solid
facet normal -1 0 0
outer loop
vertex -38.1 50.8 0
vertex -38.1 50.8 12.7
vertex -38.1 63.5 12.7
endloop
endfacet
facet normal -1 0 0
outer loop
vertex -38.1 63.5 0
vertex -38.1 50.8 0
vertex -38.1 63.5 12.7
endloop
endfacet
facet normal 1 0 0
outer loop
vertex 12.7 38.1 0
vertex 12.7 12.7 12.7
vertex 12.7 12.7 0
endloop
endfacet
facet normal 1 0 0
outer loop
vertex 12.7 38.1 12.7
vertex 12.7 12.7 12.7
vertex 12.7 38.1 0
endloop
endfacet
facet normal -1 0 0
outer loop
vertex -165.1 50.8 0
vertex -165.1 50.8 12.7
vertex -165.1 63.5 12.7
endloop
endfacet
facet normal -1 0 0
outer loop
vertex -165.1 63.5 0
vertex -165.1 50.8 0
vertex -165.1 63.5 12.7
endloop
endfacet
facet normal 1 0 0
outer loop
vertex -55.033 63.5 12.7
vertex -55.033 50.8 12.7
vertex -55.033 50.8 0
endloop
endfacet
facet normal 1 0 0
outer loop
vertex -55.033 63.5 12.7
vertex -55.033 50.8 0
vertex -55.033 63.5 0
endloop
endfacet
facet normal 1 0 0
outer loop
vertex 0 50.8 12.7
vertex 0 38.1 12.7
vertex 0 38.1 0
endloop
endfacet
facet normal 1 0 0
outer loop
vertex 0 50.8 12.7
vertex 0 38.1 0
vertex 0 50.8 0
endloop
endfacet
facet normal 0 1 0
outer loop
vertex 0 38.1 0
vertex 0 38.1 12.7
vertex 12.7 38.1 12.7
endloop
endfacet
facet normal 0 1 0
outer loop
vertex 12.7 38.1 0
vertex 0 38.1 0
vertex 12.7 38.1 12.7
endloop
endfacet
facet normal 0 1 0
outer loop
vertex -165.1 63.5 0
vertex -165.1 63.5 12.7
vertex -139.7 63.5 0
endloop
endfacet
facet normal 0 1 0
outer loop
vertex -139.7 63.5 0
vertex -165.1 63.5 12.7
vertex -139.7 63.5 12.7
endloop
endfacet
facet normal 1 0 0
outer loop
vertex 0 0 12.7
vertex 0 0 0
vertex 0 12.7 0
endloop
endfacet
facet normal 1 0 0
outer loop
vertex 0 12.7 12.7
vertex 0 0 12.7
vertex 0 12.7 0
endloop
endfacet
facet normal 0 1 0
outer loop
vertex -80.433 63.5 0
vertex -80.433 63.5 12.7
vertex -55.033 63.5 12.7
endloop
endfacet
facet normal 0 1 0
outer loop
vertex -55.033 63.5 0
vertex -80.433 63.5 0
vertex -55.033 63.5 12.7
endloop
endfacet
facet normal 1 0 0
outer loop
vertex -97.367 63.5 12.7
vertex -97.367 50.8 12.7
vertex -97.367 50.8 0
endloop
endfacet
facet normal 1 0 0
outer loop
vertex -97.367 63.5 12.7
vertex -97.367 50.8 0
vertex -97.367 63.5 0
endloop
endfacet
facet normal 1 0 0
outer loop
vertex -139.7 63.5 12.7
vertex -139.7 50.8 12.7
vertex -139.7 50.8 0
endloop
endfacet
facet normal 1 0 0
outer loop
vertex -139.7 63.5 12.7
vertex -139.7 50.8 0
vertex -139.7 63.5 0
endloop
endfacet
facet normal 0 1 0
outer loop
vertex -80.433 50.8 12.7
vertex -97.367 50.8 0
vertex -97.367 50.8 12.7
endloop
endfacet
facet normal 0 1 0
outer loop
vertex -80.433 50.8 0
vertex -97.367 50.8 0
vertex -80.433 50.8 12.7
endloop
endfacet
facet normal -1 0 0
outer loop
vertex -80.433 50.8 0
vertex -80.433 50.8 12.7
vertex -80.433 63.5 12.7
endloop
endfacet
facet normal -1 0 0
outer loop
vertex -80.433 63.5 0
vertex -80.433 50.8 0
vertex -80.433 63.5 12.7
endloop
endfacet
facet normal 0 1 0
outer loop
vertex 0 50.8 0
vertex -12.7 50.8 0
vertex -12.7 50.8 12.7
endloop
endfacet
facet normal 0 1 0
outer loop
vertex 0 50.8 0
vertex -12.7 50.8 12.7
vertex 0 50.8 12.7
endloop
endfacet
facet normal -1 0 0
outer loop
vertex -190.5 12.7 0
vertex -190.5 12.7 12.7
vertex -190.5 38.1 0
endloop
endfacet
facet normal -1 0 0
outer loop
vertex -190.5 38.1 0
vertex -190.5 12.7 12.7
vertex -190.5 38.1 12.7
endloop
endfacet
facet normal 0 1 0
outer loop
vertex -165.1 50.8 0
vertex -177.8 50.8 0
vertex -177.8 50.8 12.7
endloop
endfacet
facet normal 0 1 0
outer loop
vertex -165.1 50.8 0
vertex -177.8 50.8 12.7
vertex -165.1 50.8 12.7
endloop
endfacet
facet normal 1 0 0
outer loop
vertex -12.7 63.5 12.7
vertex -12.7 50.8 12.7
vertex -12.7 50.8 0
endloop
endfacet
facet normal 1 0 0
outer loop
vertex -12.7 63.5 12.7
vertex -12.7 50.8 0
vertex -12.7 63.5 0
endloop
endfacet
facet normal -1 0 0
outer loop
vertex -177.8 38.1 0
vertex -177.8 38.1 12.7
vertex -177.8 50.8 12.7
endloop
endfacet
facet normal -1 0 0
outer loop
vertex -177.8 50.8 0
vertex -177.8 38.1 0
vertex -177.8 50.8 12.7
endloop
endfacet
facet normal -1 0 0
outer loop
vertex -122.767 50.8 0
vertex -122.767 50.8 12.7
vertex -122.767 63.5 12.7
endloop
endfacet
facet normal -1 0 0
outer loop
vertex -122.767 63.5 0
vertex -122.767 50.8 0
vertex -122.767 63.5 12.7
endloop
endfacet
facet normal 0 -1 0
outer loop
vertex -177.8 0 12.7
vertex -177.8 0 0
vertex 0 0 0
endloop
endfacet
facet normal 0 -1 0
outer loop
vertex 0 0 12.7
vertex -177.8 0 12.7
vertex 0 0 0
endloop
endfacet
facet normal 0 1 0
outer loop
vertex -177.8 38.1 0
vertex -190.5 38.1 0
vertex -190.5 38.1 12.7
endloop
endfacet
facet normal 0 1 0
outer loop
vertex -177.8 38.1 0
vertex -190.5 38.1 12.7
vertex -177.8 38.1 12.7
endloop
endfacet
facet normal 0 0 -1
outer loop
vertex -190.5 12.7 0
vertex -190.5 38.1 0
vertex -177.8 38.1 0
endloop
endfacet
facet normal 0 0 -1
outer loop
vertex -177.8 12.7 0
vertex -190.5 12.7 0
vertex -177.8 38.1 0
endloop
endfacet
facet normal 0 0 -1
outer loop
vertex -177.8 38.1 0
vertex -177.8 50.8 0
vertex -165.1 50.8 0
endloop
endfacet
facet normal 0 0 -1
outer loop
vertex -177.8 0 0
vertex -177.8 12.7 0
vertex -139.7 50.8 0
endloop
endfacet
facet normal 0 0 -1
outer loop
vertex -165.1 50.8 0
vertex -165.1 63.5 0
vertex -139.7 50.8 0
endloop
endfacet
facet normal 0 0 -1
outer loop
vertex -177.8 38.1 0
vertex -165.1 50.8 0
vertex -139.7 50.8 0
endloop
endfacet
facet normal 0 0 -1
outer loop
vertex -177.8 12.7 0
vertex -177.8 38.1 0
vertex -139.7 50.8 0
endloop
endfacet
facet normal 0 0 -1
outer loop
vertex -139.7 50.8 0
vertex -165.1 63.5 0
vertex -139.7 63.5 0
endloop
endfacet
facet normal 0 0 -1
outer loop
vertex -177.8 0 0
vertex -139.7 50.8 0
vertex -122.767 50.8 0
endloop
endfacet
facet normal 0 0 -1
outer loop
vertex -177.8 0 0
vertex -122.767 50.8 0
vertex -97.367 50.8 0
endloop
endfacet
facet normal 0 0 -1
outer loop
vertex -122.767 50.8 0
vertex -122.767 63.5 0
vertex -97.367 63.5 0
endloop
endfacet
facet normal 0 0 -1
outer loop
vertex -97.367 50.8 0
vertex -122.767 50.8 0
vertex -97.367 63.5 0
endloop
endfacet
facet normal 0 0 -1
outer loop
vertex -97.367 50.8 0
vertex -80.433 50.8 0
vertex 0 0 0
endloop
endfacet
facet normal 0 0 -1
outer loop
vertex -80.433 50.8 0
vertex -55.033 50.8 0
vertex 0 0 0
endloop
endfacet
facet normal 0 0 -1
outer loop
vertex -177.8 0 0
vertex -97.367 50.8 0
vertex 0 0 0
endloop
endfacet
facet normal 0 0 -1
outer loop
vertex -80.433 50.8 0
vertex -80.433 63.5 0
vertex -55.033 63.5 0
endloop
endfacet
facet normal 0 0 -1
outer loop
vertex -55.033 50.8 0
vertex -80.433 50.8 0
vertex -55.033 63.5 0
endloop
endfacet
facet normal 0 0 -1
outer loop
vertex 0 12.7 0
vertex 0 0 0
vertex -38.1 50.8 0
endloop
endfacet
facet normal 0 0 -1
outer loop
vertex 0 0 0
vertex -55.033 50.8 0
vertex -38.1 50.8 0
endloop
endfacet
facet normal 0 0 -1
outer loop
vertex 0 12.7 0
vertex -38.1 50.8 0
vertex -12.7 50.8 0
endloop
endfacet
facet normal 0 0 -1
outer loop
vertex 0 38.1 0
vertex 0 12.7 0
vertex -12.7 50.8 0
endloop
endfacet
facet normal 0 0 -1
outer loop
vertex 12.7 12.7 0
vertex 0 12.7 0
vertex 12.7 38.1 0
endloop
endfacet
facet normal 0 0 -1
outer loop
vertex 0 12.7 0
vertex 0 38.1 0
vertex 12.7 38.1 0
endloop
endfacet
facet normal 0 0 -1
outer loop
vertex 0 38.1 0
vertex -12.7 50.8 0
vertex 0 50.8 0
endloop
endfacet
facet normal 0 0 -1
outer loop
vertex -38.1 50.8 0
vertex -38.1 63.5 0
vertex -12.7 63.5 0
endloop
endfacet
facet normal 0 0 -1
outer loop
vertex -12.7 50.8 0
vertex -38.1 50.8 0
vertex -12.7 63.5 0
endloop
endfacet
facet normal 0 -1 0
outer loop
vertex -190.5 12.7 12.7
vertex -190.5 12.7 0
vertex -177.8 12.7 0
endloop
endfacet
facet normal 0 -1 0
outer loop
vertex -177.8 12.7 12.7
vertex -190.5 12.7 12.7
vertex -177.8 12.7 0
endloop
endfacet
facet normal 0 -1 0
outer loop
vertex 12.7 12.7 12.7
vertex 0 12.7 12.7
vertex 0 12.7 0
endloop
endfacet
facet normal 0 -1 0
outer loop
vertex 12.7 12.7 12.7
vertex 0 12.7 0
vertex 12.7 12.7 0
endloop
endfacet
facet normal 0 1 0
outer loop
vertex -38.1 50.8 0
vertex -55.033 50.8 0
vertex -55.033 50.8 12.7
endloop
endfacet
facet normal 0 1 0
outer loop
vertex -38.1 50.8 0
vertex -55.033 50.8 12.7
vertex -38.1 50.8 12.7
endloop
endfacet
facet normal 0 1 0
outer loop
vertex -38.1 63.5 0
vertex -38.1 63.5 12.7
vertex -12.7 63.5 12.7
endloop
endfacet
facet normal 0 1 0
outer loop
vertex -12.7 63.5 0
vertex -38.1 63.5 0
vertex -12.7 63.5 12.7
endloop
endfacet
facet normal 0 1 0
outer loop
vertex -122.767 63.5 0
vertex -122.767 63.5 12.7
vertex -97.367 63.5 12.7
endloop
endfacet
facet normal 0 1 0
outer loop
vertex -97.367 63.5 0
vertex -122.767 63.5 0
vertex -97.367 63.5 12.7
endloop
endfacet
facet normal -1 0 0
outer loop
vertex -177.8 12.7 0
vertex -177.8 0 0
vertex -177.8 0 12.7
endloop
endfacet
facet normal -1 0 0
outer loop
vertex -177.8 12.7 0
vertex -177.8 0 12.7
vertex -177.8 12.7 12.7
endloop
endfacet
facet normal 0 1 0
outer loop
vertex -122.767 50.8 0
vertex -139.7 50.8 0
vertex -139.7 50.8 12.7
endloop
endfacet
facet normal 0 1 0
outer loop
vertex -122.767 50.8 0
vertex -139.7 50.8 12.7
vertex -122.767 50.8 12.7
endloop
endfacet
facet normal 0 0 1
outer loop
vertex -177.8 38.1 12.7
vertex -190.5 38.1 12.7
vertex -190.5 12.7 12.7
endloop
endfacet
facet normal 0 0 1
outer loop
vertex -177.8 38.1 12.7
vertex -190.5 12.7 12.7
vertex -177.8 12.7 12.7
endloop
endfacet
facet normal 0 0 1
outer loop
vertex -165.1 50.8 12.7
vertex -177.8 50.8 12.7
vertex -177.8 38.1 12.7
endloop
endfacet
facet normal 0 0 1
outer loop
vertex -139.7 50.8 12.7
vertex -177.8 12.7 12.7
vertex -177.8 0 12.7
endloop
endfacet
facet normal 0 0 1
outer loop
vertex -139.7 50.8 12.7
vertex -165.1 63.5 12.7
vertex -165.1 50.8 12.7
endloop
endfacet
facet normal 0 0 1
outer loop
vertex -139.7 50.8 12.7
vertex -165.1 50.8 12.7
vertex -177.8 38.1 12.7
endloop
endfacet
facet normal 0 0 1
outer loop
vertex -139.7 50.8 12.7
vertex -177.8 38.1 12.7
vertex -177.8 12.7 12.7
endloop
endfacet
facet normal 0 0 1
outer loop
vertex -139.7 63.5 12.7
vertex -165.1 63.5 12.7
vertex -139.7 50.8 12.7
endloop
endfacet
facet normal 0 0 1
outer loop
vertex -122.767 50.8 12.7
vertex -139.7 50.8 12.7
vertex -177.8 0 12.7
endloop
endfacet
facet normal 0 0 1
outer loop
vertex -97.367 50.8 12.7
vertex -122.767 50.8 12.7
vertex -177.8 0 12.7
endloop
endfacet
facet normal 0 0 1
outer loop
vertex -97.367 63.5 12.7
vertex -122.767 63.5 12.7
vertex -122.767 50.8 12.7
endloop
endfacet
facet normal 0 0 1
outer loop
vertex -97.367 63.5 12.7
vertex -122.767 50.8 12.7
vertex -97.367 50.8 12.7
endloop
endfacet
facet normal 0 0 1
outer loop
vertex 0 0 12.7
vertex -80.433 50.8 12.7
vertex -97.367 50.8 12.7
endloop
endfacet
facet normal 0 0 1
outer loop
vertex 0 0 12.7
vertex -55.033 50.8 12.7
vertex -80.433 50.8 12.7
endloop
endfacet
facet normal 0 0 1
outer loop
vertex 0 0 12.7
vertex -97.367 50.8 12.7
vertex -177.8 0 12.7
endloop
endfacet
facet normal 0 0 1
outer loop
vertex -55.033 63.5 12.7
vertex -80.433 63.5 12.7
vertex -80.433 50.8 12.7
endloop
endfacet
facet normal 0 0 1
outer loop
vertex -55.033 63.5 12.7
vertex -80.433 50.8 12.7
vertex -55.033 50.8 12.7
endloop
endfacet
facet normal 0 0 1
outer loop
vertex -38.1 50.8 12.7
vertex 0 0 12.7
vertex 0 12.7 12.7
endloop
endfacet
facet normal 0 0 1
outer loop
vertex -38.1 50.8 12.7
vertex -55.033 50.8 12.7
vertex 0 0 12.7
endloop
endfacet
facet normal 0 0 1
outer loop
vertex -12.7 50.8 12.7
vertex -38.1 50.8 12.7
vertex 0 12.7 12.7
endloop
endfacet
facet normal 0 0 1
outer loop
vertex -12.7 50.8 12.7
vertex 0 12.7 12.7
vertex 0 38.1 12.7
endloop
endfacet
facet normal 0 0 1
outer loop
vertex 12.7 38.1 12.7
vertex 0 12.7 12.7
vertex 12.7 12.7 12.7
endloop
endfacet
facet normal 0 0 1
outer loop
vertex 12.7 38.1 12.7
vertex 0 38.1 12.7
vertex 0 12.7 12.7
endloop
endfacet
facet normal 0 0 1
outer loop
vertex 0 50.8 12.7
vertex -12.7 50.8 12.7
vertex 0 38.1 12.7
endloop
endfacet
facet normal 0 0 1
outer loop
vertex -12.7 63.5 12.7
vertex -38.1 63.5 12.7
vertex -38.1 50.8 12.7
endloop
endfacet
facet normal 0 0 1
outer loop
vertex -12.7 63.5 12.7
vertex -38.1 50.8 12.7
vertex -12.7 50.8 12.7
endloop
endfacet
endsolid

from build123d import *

# Parameters (mm, degrees)
SKETCH1_W           = 177.8
SKETCH1_H           = 50.8
BOSS_EXTRUDE1_DEPTH = 12.7
SKETCH2_W           = 25.4
SKETCH2_H           = 12.7
SKETCH2_W_2         = 12.7
SKETCH2_H_2         = 25.4
BOSS_EXTRUDE2_DEPTH = 12.7


with BuildPart() as part:
    # Sketch1 → Boss-Extrude1 (new body)
    with BuildSketch(Plane.XY):
        with Locations((-88.9, 25.4)):
            Rectangle(SKETCH1_W, SKETCH1_H)
    extrude(amount=BOSS_EXTRUDE1_DEPTH)

    # Sketch2 → Boss-Extrude2 (add, through all)
    with BuildSketch(Plane.XY.offset(12.7)):
        with Locations((-152.4, 57.15)):
            Rectangle(SKETCH2_W, SKETCH2_H)
        with Locations((-110.066666667, 57.15)):
            Rectangle(SKETCH2_W, SKETCH2_H)
        with Locations((-67.733333333, 57.15)):
            Rectangle(SKETCH2_W, SKETCH2_H)
        with Locations((-25.4, 57.15)):
            Rectangle(SKETCH2_W, SKETCH2_H)
        with Locations((6.35, 25.4)):
            Rectangle(SKETCH2_W_2, SKETCH2_H_2)
        with Locations((-184.15, 25.4)):
            Rectangle(SKETCH2_W_2, SKETCH2_H_2)
    extrude(amount=-BOSS_EXTRUDE2_DEPTH)


solid = part.part
